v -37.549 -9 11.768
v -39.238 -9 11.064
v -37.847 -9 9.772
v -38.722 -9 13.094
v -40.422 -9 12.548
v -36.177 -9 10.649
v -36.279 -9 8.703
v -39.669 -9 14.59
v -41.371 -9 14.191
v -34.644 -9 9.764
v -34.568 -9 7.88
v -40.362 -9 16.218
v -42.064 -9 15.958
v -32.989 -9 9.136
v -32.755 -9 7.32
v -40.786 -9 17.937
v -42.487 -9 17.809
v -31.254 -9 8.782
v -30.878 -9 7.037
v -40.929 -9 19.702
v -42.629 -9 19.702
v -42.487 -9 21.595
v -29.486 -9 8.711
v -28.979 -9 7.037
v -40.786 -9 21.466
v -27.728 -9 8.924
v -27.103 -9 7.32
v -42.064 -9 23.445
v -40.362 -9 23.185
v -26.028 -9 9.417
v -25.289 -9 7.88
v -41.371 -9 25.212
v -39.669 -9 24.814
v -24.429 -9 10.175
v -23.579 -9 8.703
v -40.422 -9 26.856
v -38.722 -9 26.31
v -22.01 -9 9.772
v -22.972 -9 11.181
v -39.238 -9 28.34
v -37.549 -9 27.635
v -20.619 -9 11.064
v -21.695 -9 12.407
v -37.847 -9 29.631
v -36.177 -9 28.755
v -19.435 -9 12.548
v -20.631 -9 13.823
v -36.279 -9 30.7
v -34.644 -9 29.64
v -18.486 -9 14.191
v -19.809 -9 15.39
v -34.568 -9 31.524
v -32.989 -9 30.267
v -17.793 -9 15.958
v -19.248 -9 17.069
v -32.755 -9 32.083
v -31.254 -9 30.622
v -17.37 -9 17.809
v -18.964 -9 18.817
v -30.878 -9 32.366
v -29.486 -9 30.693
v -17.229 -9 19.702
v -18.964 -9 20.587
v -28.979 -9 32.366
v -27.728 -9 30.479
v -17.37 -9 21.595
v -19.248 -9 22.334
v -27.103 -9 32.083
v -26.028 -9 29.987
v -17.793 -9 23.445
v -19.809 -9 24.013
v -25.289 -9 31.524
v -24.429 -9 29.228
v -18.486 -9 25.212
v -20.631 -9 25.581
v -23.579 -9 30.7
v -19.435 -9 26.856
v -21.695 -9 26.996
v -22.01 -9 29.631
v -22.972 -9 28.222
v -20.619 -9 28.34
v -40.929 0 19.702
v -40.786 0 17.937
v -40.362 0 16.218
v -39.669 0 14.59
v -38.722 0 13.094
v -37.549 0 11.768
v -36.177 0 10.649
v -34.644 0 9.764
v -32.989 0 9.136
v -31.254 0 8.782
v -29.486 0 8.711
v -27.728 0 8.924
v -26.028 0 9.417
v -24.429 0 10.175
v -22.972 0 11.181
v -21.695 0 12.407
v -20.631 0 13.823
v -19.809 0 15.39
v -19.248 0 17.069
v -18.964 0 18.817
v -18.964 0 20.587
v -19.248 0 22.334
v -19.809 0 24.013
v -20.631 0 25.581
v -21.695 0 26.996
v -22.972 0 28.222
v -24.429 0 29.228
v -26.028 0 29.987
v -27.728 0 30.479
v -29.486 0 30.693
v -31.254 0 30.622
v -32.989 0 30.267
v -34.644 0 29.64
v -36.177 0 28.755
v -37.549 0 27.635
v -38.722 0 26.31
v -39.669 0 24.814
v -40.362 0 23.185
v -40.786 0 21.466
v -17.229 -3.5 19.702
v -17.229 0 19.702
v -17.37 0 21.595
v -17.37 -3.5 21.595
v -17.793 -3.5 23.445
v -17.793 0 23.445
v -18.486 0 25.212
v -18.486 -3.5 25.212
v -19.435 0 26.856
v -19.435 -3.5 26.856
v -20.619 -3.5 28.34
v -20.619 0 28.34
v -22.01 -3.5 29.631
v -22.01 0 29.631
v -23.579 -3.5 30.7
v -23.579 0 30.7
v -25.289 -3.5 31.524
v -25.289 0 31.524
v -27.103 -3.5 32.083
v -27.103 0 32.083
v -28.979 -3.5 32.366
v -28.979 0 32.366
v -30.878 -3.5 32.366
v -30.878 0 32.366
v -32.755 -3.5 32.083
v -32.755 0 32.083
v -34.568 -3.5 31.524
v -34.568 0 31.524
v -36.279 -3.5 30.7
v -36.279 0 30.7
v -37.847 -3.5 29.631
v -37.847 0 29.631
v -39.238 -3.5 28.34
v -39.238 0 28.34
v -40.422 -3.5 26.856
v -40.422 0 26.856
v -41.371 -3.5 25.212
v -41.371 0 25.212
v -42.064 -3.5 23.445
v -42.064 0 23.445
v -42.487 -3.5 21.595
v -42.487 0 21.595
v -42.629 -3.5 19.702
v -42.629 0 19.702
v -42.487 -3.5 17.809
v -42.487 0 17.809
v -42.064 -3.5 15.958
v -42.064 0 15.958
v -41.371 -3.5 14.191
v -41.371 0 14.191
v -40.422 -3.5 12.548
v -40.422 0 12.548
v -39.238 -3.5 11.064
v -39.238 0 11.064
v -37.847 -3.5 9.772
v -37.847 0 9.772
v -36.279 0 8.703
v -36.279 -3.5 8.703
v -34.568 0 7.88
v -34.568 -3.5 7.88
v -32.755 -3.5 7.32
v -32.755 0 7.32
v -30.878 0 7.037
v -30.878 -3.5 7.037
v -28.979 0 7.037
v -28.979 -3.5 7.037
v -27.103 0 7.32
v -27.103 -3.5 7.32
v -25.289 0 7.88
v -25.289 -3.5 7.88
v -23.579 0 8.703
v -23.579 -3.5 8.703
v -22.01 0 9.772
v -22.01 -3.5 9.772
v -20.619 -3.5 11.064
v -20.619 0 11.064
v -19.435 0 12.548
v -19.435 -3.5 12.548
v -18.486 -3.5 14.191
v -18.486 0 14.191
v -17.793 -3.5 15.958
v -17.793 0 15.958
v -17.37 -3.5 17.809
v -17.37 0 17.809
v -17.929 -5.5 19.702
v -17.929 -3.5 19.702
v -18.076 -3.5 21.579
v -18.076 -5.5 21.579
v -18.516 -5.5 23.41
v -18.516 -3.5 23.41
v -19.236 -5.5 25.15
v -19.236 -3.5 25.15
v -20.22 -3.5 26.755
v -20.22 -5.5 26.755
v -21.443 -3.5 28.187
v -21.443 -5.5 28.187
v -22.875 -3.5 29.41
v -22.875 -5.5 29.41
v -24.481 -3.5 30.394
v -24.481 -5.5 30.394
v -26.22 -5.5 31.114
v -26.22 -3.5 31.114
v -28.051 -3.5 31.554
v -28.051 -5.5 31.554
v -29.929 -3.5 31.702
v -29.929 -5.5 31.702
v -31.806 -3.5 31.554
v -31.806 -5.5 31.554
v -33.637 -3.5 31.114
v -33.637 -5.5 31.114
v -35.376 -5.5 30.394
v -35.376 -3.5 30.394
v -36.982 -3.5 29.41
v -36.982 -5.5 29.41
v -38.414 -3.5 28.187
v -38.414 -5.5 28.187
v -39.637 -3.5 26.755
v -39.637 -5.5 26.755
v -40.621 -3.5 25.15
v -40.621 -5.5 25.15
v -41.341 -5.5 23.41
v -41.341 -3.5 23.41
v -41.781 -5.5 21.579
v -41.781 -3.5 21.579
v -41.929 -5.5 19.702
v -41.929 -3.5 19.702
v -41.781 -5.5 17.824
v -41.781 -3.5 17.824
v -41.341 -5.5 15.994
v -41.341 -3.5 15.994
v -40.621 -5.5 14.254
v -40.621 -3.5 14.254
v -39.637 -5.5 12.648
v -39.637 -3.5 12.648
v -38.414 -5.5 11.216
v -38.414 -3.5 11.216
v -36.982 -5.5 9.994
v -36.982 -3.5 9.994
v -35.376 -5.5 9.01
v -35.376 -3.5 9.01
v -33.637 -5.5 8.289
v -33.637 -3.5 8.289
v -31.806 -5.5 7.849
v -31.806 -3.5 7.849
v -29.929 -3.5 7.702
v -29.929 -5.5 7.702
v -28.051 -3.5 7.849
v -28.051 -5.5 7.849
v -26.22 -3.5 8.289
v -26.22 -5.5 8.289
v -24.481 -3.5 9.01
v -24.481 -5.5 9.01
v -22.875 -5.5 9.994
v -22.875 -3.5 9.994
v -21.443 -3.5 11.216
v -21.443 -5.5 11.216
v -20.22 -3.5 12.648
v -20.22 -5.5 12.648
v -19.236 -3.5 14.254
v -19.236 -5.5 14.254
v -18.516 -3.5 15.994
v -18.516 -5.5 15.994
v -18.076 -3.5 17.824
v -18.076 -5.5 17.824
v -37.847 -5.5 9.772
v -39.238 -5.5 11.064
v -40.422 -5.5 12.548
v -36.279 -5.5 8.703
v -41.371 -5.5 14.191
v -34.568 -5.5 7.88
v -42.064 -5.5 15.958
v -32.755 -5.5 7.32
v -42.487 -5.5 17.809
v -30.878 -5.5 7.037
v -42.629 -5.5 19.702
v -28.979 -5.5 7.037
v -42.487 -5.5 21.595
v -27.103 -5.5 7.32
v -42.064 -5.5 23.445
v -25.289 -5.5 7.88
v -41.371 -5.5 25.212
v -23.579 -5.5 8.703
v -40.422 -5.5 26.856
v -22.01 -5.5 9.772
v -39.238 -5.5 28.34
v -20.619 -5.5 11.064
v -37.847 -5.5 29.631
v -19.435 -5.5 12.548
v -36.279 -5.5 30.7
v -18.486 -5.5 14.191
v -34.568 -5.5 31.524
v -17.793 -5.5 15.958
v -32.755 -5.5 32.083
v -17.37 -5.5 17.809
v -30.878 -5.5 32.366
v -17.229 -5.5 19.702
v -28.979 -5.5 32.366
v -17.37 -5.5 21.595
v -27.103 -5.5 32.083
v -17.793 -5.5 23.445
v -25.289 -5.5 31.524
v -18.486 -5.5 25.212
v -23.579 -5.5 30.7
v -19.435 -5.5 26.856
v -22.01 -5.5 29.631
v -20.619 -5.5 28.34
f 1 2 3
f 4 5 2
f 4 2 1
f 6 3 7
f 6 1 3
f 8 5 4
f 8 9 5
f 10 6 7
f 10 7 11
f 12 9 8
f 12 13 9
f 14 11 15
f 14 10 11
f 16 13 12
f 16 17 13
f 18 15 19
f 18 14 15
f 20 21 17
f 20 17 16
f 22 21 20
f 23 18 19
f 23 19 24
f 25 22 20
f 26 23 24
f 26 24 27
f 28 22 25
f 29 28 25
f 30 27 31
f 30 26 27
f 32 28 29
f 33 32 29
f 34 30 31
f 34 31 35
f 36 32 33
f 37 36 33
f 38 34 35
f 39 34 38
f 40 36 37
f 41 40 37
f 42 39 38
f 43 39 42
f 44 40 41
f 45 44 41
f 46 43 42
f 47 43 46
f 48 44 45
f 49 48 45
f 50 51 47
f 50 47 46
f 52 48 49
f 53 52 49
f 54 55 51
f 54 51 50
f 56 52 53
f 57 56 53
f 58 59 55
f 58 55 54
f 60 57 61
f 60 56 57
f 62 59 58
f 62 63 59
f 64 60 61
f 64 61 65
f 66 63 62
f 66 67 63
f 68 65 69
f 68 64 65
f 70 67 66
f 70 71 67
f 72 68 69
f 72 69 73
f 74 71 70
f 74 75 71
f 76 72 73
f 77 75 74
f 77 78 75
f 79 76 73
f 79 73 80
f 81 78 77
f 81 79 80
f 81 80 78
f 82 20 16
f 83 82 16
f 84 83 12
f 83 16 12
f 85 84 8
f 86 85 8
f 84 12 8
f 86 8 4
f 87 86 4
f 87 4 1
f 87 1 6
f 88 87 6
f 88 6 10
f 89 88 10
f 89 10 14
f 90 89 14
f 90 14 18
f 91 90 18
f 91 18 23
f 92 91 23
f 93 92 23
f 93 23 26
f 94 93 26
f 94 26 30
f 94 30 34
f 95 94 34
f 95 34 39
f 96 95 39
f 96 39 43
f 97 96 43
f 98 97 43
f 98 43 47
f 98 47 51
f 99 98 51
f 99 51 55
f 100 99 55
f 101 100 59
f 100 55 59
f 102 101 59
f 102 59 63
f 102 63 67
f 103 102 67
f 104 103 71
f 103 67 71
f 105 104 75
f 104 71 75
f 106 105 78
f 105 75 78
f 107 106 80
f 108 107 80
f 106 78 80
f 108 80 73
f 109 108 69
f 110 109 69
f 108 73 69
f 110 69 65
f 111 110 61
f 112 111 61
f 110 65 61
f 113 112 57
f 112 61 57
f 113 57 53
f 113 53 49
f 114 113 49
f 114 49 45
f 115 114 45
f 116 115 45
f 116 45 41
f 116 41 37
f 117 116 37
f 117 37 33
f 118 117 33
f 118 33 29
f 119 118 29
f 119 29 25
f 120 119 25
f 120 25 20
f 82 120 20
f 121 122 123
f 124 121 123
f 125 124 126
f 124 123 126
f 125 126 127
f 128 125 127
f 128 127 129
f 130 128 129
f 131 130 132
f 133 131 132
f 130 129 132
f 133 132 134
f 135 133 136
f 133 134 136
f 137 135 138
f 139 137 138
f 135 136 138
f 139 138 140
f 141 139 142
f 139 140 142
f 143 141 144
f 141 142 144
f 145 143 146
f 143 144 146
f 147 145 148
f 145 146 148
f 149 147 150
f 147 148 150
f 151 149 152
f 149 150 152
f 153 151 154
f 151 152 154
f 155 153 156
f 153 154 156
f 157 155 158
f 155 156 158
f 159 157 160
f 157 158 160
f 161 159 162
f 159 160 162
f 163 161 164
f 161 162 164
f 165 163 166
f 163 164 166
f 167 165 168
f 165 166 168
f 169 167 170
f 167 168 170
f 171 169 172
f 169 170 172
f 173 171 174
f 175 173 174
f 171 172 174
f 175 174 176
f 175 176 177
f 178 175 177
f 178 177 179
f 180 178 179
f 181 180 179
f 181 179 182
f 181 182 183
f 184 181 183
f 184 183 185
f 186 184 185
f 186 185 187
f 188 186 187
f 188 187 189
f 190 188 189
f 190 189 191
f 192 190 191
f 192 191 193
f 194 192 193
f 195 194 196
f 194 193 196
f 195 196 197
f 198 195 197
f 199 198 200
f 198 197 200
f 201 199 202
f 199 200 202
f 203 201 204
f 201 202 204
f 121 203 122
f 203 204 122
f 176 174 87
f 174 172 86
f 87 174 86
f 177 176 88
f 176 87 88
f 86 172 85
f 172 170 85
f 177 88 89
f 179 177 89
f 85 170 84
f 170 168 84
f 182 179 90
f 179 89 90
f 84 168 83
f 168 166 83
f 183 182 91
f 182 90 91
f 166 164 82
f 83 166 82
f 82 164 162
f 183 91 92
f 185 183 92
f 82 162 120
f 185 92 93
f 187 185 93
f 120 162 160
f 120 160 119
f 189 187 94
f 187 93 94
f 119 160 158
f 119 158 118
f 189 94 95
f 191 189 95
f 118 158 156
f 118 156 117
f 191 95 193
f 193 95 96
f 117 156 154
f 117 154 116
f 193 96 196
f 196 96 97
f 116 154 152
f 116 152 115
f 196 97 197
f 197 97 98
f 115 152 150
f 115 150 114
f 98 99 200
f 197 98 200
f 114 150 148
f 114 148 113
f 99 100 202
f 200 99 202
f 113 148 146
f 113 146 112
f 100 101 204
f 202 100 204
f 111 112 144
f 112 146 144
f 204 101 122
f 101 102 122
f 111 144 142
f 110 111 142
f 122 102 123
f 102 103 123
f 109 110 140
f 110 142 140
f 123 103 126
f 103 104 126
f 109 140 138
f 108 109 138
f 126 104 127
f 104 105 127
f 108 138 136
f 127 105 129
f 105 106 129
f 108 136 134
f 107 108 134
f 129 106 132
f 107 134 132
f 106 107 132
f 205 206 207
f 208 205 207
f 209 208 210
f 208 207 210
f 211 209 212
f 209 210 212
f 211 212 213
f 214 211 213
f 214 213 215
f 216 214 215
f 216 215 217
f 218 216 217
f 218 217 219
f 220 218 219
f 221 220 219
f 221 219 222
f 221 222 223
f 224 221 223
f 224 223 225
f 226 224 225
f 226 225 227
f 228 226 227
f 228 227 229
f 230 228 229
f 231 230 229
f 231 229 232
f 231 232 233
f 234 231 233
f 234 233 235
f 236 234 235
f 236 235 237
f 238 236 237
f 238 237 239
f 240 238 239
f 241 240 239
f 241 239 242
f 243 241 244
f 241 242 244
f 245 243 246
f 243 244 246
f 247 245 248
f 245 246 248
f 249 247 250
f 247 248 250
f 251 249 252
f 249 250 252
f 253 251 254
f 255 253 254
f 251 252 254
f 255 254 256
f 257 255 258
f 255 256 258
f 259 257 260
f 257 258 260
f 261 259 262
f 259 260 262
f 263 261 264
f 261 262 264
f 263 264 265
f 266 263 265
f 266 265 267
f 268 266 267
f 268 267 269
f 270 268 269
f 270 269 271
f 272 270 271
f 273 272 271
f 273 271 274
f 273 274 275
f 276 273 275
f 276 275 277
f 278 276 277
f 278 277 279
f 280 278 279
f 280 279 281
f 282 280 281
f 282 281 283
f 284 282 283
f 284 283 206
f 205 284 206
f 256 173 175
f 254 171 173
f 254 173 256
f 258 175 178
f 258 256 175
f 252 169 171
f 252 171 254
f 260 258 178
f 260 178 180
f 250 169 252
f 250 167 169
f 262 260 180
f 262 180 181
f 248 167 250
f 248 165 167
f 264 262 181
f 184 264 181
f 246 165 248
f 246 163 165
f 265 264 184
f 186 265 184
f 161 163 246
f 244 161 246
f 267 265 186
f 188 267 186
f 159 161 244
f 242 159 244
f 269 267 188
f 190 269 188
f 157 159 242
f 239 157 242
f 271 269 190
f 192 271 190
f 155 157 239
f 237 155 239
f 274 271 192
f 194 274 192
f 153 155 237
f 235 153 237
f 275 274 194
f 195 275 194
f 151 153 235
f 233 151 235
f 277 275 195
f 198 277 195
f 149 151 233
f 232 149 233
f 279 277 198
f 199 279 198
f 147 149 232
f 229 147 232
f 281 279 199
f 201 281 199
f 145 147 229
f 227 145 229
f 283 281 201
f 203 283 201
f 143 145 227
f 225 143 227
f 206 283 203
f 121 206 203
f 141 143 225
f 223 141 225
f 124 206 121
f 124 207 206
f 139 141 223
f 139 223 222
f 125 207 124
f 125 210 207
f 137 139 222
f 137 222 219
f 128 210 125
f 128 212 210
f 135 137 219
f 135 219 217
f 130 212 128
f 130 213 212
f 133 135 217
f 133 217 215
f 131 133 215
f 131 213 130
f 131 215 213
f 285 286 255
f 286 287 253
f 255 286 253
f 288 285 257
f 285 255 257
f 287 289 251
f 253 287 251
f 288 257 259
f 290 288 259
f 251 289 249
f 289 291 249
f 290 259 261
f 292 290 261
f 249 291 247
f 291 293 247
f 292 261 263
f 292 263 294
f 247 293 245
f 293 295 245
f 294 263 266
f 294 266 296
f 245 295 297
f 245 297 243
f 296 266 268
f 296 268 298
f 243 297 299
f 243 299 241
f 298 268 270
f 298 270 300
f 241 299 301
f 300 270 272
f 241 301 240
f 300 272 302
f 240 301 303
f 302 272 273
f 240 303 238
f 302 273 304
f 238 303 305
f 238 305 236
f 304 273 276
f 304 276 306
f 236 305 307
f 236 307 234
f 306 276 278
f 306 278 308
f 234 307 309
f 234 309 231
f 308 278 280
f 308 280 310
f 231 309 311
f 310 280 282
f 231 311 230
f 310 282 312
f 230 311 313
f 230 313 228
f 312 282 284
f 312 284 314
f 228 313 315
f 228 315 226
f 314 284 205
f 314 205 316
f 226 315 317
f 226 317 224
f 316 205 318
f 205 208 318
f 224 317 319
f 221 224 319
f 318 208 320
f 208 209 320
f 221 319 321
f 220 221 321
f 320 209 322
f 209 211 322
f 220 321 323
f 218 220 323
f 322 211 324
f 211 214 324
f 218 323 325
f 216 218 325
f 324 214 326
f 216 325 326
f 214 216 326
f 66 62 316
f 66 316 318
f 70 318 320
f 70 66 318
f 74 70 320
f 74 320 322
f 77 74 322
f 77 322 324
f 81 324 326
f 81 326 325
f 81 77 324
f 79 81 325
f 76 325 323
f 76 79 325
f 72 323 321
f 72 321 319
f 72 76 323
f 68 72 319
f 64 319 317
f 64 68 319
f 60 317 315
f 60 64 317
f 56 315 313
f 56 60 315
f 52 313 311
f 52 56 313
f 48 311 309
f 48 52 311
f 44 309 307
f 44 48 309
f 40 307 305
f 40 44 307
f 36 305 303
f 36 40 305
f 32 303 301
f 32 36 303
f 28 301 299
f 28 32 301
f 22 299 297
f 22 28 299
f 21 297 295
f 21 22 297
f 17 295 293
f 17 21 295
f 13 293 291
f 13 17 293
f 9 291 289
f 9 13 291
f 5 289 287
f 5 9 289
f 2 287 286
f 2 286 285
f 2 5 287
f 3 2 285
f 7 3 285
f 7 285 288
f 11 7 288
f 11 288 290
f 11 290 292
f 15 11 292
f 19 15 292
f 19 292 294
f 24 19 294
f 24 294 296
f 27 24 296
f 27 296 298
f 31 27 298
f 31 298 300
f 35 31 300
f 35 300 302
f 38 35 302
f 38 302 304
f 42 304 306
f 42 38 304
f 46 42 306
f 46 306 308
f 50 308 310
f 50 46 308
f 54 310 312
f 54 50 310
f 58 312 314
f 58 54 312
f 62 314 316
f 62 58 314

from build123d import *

# Parameters (mm, degrees)
F0_R     = 12
F1_DEPTH = 9
F2_R     = 12.7
F3_DEPTH = 3.5
F4_R     = 12.7
F4_R_2   = 12
F5_DEPTH = 3.5
F6_D     = 22


# Not quite as in the source:
# - a feature names something its author has since deleted; it is built from what else it names


with BuildPart() as f1:
    # F0 (on Front) → F1 (new body)
    with BuildSketch(Plane.XZ):
        with Locations((-29.9285538495, 19.7017099708)):
            Circle(F0_R)
    extrude(amount=F1_DEPTH)

    # F2 (on Front) → F3 (join)
    with BuildSketch(Plane.XZ):
        with Locations((-29.9285538495, 19.7017099708)):
            Circle(F2_R)
    extrude(amount=F3_DEPTH)

    # F4 (on face) → F5 (join)
    with BuildSketch(Plane.XZ.offset(9)):
        with Locations((-29.9285538495, 19.7017099708)):
            Circle(F4_R)
        with Locations((-29.9285538495, 19.7017099708)):
            Circle(F4_R_2, mode=Mode.SUBTRACT)
    extrude(amount=-F5_DEPTH)

    # F6 (through all)
    with Locations(Plane(origin=(0, 0, 0), x_dir=(1, 0, 0), z_dir=(0, 1, 0))):
        with Locations((-29.9285538495, -19.7017099708)):
            Hole(F6_D / 2)


solid = f1.part
